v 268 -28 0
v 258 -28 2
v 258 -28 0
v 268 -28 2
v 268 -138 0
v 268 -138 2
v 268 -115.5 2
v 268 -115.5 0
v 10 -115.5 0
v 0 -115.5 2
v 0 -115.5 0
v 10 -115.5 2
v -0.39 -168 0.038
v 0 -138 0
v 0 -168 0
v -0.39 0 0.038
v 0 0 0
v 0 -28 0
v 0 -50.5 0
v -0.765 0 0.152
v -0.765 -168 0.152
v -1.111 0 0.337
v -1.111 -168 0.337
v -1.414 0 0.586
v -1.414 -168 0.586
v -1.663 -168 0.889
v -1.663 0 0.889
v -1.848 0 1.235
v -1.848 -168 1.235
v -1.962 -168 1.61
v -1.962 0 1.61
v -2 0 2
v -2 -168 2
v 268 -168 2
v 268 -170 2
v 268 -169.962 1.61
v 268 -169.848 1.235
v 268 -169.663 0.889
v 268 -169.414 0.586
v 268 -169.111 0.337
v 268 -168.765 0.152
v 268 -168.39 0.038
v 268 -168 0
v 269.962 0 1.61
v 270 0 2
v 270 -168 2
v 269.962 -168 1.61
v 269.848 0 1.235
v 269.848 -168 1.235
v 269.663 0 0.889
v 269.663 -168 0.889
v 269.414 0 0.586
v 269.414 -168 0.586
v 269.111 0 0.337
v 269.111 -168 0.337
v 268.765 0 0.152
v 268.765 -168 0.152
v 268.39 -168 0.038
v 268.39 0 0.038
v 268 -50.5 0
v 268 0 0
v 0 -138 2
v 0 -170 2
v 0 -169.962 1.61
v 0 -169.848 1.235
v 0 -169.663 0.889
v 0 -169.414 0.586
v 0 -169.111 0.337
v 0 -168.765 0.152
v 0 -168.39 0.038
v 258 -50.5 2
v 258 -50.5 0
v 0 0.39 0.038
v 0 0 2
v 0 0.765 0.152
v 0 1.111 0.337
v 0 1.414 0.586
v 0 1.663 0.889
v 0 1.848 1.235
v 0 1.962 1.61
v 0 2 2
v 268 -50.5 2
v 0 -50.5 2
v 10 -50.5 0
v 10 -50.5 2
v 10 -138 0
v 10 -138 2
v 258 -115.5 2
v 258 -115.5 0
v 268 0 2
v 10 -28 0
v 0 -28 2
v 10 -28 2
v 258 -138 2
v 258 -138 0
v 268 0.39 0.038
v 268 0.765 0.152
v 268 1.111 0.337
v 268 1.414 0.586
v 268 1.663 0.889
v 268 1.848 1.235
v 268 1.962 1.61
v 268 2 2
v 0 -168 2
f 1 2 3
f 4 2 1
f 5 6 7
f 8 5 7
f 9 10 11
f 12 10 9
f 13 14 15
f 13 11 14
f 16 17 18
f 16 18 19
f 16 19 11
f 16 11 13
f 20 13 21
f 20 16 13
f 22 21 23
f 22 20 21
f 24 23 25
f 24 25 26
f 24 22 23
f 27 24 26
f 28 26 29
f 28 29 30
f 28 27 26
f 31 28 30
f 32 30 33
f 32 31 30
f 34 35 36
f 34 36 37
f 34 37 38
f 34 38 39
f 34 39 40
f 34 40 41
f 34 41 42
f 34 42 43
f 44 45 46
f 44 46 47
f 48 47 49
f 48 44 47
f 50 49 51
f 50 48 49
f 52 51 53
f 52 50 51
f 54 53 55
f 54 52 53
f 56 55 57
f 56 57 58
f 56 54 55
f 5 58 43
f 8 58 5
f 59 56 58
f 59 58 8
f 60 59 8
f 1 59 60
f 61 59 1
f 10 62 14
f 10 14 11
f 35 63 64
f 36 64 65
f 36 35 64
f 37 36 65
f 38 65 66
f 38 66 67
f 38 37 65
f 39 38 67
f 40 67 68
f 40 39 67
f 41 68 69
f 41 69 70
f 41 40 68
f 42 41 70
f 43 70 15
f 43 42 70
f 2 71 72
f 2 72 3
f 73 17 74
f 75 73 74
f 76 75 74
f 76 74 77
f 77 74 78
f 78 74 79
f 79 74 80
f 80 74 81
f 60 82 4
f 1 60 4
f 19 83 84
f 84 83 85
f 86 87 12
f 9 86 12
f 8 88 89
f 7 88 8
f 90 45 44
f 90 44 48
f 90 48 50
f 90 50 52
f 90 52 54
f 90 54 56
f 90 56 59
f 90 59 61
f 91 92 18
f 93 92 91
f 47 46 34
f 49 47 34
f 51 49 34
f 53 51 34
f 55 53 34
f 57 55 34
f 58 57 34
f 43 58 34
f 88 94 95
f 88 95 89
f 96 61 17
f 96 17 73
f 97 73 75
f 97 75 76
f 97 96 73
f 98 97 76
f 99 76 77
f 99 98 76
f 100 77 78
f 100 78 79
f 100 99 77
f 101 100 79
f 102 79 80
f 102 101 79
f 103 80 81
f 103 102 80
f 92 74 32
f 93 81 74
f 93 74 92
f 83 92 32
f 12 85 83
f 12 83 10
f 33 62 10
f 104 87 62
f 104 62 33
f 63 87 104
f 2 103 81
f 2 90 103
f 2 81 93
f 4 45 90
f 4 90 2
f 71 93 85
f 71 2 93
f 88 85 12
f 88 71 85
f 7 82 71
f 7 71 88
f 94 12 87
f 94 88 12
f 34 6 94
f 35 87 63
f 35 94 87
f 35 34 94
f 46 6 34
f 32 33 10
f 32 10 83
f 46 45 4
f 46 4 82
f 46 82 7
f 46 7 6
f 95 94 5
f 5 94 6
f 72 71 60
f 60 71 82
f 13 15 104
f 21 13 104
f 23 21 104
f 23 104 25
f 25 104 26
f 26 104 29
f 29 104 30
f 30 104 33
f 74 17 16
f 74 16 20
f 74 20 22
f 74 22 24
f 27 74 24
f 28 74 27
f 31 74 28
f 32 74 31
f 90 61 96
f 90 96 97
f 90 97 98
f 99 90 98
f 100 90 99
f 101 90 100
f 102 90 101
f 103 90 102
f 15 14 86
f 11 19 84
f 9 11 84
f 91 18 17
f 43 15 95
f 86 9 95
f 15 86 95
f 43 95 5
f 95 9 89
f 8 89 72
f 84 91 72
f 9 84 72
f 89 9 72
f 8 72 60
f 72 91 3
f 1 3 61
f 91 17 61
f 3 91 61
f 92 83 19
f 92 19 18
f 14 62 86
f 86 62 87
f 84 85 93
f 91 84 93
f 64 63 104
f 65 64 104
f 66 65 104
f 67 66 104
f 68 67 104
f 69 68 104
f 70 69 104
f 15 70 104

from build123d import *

# Parameters (mm, degrees)
F0_W     = 268
F0_H     = 168
F1_DEPTH = 2
F3_DEPTH = 268
F6_DEPTH = 168
F7_DEPTH = 268
F8_W     = 10
F8_H     = 22.5
F9_DEPTH = 25


with BuildPart() as f1:
    # F0 (on Top) → F1 (new body)
    with BuildSketch(Plane.XY):
        with Locations((134, -84)):
            Rectangle(F0_W, F0_H)
    extrude(amount=F1_DEPTH)

    # F2 (on face) → F3 (join)
    with BuildSketch(Plane.YZ.offset(268)):
        with BuildLine():
            Line((-168, 2), (-170, 2))
            ThreePointArc((-170, 2), (-169.414214, 0.585786), (-168, 0))
            Line((-168, 0), (-168, 2))
        make_face()
    extrude(amount=-F3_DEPTH)

    # F4 (on face) → F6 (join)
    with BuildSketch(Plane(origin=(0, 0, 0), x_dir=(-1, 0, 0), z_dir=(0, 1, 0))):
        with BuildLine():
            Line((0, 2), (0, 0))
            ThreePointArc((0, 0), (1.414214, 0.585786), (2, 2))
            Line((2, 2), (0, 2))
        make_face()
        with BuildLine():
            Line((-268, 2), (-270, 2))
            ThreePointArc((-270, 2), (-269.414214, 0.585786), (-268, 0))
            Line((-268, 0), (-268, 2))
        make_face()
    extrude(amount=-F6_DEPTH)

    # F5 (on face) → F7 (join)
    with BuildSketch(Plane.YZ.offset(268)):
        with BuildLine():
            Line((0, 2), (0, 0))
            ThreePointArc((0, 0), (1.414214, 0.585786), (2, 2))
            Line((2, 2), (0, 2))
        make_face()
    extrude(amount=-F7_DEPTH)

    # F8 (on face) → F9 (cut)
    with BuildSketch(Plane.XY.offset(2)):
        with Locations((263, -39.25)):
            Rectangle(F8_W, F8_H)
        with Locations((263, -126.75)):
            Rectangle(F8_W, F8_H)
        with Locations((5, -126.75)):
            Rectangle(F8_W, F8_H)
        with Locations((5, -39.25)):
            Rectangle(F8_W, F8_H)
    extrude(amount=-F9_DEPTH, mode=Mode.SUBTRACT)


solid = f1.part
